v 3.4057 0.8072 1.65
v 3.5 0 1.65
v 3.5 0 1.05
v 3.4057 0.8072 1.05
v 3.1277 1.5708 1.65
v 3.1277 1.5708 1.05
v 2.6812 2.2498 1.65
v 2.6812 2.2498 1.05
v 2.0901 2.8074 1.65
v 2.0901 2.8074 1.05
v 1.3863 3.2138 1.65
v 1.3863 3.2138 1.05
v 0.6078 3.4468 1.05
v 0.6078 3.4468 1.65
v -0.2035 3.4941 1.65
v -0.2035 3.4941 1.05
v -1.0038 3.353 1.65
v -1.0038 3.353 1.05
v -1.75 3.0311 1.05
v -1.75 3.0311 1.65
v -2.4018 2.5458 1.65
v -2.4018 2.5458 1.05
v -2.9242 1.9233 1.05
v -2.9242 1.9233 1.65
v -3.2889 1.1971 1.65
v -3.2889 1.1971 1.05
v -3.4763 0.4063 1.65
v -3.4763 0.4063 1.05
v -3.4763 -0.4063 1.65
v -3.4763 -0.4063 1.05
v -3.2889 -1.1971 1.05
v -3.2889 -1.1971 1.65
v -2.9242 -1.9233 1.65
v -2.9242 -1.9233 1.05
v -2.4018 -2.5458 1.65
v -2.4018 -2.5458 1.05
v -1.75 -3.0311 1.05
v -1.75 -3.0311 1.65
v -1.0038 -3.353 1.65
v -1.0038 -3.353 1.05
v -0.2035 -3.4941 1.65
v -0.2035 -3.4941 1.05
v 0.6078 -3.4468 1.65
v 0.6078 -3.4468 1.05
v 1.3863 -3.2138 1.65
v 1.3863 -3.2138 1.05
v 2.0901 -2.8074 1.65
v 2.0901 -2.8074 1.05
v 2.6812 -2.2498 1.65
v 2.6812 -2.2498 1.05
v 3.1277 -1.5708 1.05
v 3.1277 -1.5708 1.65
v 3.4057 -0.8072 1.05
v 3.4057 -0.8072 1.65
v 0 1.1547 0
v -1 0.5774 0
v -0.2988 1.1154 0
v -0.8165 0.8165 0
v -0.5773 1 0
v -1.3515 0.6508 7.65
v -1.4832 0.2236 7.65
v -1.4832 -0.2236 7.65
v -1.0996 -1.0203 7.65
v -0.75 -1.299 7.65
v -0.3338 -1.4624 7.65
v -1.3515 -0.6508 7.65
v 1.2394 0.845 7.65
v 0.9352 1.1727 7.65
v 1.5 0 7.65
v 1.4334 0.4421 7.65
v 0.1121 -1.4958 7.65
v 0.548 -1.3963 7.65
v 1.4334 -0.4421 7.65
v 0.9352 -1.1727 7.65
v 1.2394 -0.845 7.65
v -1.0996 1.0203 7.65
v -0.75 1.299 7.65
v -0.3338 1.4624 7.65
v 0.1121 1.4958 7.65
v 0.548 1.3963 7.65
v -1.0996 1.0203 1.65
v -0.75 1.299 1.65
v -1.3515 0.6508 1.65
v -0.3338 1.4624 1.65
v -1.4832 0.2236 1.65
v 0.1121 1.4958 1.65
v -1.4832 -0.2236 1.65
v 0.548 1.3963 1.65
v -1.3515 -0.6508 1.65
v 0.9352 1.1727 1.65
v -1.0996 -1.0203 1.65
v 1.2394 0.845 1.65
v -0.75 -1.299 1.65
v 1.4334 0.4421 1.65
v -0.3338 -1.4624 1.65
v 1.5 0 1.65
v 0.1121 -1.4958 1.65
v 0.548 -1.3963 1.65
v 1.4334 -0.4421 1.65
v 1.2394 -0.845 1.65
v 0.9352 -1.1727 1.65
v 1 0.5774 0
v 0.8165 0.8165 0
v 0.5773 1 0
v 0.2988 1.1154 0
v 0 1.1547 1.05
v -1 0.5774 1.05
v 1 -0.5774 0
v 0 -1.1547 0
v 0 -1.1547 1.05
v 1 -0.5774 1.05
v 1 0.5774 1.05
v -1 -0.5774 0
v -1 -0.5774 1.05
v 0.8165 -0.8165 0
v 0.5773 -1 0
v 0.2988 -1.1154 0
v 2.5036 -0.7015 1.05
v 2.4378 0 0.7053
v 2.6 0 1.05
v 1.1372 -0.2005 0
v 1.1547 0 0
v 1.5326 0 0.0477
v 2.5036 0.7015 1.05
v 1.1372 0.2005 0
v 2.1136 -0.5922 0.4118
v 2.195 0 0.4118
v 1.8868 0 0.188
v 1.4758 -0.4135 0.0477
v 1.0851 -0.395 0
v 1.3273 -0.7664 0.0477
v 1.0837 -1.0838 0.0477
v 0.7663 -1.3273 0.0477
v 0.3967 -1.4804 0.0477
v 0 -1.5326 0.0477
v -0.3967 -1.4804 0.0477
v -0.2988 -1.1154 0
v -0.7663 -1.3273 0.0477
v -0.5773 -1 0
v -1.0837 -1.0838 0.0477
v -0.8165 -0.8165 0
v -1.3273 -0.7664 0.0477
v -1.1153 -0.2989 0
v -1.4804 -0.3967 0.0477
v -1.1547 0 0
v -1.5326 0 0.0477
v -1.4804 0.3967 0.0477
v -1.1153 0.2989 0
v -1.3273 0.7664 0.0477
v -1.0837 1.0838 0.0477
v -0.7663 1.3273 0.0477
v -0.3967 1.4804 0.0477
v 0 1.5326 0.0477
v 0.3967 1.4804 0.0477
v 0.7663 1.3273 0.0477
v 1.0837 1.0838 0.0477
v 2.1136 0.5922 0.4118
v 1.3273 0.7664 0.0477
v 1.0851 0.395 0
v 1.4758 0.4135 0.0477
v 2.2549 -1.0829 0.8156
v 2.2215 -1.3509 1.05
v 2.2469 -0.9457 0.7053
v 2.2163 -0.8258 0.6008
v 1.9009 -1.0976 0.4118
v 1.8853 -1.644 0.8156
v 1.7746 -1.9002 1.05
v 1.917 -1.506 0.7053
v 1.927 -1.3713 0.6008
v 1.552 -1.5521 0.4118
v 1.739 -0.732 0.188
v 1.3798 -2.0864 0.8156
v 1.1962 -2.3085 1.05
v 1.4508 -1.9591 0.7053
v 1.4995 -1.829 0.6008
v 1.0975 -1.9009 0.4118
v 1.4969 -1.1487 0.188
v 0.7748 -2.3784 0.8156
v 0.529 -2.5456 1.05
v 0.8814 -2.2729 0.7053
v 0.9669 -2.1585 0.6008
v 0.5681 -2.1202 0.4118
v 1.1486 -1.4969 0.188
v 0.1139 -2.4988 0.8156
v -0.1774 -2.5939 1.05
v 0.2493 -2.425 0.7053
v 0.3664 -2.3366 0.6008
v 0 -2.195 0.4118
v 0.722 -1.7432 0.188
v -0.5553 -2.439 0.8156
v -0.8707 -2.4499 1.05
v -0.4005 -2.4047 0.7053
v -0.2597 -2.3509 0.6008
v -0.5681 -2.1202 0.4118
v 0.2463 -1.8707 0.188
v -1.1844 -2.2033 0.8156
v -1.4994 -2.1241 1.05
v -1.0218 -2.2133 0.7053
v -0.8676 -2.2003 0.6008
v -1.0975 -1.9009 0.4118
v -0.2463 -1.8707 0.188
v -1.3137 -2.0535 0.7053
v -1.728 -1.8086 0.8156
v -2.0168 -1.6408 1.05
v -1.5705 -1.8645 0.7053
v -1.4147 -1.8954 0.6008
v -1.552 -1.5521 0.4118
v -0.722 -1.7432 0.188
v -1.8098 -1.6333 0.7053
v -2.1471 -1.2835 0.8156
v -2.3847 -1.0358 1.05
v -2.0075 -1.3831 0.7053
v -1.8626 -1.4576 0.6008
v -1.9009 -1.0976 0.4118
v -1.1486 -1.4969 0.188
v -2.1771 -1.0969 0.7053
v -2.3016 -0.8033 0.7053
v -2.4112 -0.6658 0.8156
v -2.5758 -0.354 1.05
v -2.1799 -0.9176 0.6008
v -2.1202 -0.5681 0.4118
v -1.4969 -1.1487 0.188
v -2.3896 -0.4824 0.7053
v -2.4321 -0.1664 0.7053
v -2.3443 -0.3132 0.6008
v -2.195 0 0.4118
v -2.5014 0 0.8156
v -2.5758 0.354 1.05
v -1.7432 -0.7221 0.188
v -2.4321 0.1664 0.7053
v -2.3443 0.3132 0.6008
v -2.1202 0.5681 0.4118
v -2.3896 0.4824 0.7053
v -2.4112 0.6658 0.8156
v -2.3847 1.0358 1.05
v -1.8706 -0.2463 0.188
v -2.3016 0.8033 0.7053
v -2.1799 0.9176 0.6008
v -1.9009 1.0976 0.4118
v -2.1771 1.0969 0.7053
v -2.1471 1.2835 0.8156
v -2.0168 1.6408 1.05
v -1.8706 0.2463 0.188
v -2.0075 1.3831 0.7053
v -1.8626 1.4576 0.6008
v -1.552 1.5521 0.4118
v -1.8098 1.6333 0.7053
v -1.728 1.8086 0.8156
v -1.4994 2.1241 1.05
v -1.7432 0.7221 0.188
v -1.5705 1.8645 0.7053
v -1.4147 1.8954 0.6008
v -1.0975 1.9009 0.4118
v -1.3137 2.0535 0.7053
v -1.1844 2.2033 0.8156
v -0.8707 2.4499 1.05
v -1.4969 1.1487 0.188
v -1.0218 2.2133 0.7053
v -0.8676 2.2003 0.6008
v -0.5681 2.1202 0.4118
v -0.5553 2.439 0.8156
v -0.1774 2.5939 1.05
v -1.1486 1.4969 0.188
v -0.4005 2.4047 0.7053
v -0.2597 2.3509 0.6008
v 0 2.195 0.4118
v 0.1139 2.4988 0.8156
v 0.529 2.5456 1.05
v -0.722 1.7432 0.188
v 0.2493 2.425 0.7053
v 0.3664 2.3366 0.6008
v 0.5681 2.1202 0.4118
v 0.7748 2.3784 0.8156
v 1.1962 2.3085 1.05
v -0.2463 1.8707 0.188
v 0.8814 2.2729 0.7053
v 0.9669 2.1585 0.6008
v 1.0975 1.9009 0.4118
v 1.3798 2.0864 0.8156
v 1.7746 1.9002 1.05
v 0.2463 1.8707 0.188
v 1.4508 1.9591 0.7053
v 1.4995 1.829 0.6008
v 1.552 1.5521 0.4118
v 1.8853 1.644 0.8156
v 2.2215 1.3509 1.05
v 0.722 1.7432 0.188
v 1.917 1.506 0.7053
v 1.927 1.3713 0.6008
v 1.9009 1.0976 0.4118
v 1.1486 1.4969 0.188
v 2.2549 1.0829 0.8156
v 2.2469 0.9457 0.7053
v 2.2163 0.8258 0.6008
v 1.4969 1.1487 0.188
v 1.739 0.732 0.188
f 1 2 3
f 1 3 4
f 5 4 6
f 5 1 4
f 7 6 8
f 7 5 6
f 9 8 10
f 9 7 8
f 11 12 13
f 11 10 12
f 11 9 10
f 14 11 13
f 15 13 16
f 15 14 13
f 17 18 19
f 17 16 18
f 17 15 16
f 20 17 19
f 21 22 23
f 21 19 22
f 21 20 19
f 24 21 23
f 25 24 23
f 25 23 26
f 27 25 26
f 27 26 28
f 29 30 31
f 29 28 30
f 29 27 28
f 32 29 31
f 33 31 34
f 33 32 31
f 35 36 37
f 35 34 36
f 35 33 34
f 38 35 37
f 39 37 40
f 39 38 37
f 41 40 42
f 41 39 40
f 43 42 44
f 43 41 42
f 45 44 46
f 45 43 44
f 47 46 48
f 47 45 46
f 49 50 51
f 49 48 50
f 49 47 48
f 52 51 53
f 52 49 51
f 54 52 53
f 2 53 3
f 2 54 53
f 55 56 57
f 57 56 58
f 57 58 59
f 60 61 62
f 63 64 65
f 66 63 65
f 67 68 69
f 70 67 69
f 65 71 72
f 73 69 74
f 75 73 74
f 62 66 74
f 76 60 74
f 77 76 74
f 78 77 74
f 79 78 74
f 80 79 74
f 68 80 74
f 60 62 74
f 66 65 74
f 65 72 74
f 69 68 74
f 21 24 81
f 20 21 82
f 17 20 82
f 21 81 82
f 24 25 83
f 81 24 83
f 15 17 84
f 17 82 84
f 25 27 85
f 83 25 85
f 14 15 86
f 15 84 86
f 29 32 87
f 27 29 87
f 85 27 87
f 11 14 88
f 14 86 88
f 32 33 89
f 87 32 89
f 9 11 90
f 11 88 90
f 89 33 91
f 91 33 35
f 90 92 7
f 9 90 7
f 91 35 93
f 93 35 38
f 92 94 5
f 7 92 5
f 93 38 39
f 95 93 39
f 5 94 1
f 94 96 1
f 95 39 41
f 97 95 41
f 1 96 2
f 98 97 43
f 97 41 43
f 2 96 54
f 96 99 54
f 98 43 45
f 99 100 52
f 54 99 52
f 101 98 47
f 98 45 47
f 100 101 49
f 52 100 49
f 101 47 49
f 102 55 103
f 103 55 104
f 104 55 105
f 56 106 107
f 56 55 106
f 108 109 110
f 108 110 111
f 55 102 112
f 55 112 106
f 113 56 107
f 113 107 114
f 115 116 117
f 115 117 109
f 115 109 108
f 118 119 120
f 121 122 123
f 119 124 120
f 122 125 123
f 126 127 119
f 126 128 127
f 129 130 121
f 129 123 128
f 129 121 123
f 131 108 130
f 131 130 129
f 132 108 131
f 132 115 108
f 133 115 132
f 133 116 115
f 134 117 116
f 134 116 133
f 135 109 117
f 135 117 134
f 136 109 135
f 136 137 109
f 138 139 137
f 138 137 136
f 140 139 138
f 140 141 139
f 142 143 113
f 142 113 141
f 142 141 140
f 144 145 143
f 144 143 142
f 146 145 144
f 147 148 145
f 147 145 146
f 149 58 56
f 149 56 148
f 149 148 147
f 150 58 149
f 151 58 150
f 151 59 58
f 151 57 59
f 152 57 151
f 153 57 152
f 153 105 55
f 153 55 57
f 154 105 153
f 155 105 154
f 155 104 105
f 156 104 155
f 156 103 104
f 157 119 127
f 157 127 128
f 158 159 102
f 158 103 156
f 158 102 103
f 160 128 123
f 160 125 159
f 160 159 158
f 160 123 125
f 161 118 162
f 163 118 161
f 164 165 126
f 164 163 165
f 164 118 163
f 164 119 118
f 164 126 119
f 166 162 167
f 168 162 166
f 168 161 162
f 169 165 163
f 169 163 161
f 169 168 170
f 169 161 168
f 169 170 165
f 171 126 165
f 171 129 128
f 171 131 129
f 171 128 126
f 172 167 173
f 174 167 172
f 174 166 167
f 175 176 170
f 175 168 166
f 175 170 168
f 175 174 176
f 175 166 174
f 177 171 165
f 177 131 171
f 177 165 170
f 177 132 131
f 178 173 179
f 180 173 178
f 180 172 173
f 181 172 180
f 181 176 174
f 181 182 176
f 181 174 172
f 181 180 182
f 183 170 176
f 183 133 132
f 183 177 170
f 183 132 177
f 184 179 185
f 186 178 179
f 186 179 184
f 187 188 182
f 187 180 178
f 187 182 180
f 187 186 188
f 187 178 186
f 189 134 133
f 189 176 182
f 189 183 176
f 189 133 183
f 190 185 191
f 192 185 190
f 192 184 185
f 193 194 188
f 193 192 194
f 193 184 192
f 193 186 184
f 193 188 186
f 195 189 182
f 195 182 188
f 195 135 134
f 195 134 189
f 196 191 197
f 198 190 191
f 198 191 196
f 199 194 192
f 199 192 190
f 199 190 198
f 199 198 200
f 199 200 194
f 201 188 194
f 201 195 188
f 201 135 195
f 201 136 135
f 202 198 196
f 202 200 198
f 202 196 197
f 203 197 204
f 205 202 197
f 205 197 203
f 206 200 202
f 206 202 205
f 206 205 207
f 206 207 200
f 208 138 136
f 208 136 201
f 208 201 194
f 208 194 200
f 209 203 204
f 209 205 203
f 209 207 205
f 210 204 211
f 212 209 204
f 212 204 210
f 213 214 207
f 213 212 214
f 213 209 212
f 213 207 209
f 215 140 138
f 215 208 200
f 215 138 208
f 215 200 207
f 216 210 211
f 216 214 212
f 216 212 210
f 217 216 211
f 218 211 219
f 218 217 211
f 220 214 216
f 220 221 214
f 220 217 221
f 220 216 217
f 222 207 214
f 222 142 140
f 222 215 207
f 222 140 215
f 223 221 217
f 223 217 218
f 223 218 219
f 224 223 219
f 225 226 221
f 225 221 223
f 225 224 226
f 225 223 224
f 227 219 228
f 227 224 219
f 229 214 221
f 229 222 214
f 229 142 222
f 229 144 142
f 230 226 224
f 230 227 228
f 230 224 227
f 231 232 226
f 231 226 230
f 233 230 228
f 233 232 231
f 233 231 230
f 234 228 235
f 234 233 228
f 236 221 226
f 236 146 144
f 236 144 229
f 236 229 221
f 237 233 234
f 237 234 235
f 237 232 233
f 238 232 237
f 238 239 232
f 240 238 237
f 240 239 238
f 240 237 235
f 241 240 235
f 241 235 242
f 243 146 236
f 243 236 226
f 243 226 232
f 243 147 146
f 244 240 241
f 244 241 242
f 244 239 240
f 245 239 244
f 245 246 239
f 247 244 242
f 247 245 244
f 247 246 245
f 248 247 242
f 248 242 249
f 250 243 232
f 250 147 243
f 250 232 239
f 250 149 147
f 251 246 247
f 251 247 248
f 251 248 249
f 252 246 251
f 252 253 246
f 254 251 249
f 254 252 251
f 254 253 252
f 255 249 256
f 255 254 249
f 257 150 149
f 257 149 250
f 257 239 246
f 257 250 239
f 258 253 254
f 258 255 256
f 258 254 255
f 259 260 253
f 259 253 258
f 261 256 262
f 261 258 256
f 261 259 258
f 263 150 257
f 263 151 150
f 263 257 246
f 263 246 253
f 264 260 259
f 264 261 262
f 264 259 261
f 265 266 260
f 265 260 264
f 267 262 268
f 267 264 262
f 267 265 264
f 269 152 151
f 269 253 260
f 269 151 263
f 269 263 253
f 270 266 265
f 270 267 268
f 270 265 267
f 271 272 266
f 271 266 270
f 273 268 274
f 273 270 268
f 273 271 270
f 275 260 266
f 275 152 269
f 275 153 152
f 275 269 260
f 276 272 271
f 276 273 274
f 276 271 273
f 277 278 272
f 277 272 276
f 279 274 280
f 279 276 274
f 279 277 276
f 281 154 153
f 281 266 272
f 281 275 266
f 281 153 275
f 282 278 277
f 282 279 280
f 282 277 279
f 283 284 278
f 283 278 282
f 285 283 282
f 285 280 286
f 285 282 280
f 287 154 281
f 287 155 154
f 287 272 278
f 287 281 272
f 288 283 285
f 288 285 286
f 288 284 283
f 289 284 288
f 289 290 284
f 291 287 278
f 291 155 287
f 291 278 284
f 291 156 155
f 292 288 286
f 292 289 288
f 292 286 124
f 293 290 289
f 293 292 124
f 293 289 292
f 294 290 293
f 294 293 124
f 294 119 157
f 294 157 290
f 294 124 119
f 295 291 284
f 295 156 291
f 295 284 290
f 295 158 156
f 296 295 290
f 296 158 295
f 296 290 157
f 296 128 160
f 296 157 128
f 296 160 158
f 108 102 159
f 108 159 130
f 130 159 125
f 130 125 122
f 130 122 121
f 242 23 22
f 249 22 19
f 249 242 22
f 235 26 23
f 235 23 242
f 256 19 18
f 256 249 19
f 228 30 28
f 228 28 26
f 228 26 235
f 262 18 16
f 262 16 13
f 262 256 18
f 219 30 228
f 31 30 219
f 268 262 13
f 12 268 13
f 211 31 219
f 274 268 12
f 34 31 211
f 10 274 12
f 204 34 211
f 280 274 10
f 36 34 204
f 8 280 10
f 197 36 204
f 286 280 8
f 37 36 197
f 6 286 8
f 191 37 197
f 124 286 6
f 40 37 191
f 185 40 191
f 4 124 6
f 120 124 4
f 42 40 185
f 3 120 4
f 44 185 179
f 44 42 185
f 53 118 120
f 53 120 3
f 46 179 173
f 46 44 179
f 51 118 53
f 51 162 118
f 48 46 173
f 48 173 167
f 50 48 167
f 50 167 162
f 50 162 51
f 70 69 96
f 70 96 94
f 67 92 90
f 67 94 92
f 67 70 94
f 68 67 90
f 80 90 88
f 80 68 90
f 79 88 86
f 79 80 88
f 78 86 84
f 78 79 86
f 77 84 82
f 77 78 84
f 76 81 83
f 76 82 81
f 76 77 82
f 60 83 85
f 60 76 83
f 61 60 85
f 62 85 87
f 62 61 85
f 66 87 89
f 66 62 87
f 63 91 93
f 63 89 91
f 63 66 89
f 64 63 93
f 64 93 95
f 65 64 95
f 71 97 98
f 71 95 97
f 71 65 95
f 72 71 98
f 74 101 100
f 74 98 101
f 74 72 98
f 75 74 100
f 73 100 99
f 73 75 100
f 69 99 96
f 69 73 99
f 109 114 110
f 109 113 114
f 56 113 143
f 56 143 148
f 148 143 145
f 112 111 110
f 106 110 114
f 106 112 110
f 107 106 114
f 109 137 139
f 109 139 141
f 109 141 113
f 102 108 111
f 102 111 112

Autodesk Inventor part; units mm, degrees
ref_plane "YZ Plane" through (0, 0, 0) normal (1, 0, 0) x (0, 1, 0)
ref_plane "XZ Plane" through (0, 0, 0) normal (0, 1, 0) x (-1, 0, 0)
ref_plane "XY Plane" through (0, 0, 0) normal (0, 0, 1) x (1, 0, 0)
sketch "スケッチ1" plane through (0, 0, 0) normal (0, 1, 0) x (-1, 0, 0)
  line L0 (0, 0) -> (-1.1547, 0)
  line L1 (-2.6, 1.05) -> (-3.5, 1.05)
  line L2 (-3.5, 1.05) -> (-3.5, 1.65)
  line L3 (-3.5, 1.65) -> (-1.5, 1.65)
  line L4 (-1.5, 1.65) -> (-1.5, 7.65)
  line L5 (-1.5, 7.65) -> (0, 7.65)
  line L6 (0, 7.65) -> (0, 0)
  arc A0 (-2.6, 1.05) -> (-1.1547, 0) centre (-1.1547, 1.5197) ccw
  dimension "d0" = 5.2
  dimension "d1" = 7
  dimension "d3" = 1.65
  dimension "d4" = 0.6
  dimension "d5" = 2.3094
  dimension "d6" = 6
  dimension "d7" = 3
revolve "回転1" add sketch "スケッチ1" angle 360 about axis through (0, 0, 7.65) along (0, 0, -1)
thread "ねじ1" size "M3x0.5" class "6g" standard "ANSI Metric M Profile" length 7.57
sketch "スケッチ2" plane through (0, 0, 0) normal (0, 0, -1) x (-1, 0, 0)
  circle A0 centre (0, 0) radius 1.1547 projected
  line L0 (0, 1.1547) -> (1, 0.5774)
  line L1 (1, 0.5774) -> (1, -0.5774)
  line L2 (1, -0.5774) -> (0, -1.1547)
  line L3 (0, -1.1547) -> (-1, -0.5774)
  line L4 (-1, -0.5774) -> (-1, 0.5774)
  line L5 (-1, 0.5774) -> (0, 1.1547)
  point P0 (0, 0)
  point P1 (0, 0)
extrude "押し出し1" cut sketch "スケッチ2" against normal blind 1.05 contours L1 L2 L3 L4 L5 L0
properties part number "620103006" material "ステンレス鋼 AISI 304"
